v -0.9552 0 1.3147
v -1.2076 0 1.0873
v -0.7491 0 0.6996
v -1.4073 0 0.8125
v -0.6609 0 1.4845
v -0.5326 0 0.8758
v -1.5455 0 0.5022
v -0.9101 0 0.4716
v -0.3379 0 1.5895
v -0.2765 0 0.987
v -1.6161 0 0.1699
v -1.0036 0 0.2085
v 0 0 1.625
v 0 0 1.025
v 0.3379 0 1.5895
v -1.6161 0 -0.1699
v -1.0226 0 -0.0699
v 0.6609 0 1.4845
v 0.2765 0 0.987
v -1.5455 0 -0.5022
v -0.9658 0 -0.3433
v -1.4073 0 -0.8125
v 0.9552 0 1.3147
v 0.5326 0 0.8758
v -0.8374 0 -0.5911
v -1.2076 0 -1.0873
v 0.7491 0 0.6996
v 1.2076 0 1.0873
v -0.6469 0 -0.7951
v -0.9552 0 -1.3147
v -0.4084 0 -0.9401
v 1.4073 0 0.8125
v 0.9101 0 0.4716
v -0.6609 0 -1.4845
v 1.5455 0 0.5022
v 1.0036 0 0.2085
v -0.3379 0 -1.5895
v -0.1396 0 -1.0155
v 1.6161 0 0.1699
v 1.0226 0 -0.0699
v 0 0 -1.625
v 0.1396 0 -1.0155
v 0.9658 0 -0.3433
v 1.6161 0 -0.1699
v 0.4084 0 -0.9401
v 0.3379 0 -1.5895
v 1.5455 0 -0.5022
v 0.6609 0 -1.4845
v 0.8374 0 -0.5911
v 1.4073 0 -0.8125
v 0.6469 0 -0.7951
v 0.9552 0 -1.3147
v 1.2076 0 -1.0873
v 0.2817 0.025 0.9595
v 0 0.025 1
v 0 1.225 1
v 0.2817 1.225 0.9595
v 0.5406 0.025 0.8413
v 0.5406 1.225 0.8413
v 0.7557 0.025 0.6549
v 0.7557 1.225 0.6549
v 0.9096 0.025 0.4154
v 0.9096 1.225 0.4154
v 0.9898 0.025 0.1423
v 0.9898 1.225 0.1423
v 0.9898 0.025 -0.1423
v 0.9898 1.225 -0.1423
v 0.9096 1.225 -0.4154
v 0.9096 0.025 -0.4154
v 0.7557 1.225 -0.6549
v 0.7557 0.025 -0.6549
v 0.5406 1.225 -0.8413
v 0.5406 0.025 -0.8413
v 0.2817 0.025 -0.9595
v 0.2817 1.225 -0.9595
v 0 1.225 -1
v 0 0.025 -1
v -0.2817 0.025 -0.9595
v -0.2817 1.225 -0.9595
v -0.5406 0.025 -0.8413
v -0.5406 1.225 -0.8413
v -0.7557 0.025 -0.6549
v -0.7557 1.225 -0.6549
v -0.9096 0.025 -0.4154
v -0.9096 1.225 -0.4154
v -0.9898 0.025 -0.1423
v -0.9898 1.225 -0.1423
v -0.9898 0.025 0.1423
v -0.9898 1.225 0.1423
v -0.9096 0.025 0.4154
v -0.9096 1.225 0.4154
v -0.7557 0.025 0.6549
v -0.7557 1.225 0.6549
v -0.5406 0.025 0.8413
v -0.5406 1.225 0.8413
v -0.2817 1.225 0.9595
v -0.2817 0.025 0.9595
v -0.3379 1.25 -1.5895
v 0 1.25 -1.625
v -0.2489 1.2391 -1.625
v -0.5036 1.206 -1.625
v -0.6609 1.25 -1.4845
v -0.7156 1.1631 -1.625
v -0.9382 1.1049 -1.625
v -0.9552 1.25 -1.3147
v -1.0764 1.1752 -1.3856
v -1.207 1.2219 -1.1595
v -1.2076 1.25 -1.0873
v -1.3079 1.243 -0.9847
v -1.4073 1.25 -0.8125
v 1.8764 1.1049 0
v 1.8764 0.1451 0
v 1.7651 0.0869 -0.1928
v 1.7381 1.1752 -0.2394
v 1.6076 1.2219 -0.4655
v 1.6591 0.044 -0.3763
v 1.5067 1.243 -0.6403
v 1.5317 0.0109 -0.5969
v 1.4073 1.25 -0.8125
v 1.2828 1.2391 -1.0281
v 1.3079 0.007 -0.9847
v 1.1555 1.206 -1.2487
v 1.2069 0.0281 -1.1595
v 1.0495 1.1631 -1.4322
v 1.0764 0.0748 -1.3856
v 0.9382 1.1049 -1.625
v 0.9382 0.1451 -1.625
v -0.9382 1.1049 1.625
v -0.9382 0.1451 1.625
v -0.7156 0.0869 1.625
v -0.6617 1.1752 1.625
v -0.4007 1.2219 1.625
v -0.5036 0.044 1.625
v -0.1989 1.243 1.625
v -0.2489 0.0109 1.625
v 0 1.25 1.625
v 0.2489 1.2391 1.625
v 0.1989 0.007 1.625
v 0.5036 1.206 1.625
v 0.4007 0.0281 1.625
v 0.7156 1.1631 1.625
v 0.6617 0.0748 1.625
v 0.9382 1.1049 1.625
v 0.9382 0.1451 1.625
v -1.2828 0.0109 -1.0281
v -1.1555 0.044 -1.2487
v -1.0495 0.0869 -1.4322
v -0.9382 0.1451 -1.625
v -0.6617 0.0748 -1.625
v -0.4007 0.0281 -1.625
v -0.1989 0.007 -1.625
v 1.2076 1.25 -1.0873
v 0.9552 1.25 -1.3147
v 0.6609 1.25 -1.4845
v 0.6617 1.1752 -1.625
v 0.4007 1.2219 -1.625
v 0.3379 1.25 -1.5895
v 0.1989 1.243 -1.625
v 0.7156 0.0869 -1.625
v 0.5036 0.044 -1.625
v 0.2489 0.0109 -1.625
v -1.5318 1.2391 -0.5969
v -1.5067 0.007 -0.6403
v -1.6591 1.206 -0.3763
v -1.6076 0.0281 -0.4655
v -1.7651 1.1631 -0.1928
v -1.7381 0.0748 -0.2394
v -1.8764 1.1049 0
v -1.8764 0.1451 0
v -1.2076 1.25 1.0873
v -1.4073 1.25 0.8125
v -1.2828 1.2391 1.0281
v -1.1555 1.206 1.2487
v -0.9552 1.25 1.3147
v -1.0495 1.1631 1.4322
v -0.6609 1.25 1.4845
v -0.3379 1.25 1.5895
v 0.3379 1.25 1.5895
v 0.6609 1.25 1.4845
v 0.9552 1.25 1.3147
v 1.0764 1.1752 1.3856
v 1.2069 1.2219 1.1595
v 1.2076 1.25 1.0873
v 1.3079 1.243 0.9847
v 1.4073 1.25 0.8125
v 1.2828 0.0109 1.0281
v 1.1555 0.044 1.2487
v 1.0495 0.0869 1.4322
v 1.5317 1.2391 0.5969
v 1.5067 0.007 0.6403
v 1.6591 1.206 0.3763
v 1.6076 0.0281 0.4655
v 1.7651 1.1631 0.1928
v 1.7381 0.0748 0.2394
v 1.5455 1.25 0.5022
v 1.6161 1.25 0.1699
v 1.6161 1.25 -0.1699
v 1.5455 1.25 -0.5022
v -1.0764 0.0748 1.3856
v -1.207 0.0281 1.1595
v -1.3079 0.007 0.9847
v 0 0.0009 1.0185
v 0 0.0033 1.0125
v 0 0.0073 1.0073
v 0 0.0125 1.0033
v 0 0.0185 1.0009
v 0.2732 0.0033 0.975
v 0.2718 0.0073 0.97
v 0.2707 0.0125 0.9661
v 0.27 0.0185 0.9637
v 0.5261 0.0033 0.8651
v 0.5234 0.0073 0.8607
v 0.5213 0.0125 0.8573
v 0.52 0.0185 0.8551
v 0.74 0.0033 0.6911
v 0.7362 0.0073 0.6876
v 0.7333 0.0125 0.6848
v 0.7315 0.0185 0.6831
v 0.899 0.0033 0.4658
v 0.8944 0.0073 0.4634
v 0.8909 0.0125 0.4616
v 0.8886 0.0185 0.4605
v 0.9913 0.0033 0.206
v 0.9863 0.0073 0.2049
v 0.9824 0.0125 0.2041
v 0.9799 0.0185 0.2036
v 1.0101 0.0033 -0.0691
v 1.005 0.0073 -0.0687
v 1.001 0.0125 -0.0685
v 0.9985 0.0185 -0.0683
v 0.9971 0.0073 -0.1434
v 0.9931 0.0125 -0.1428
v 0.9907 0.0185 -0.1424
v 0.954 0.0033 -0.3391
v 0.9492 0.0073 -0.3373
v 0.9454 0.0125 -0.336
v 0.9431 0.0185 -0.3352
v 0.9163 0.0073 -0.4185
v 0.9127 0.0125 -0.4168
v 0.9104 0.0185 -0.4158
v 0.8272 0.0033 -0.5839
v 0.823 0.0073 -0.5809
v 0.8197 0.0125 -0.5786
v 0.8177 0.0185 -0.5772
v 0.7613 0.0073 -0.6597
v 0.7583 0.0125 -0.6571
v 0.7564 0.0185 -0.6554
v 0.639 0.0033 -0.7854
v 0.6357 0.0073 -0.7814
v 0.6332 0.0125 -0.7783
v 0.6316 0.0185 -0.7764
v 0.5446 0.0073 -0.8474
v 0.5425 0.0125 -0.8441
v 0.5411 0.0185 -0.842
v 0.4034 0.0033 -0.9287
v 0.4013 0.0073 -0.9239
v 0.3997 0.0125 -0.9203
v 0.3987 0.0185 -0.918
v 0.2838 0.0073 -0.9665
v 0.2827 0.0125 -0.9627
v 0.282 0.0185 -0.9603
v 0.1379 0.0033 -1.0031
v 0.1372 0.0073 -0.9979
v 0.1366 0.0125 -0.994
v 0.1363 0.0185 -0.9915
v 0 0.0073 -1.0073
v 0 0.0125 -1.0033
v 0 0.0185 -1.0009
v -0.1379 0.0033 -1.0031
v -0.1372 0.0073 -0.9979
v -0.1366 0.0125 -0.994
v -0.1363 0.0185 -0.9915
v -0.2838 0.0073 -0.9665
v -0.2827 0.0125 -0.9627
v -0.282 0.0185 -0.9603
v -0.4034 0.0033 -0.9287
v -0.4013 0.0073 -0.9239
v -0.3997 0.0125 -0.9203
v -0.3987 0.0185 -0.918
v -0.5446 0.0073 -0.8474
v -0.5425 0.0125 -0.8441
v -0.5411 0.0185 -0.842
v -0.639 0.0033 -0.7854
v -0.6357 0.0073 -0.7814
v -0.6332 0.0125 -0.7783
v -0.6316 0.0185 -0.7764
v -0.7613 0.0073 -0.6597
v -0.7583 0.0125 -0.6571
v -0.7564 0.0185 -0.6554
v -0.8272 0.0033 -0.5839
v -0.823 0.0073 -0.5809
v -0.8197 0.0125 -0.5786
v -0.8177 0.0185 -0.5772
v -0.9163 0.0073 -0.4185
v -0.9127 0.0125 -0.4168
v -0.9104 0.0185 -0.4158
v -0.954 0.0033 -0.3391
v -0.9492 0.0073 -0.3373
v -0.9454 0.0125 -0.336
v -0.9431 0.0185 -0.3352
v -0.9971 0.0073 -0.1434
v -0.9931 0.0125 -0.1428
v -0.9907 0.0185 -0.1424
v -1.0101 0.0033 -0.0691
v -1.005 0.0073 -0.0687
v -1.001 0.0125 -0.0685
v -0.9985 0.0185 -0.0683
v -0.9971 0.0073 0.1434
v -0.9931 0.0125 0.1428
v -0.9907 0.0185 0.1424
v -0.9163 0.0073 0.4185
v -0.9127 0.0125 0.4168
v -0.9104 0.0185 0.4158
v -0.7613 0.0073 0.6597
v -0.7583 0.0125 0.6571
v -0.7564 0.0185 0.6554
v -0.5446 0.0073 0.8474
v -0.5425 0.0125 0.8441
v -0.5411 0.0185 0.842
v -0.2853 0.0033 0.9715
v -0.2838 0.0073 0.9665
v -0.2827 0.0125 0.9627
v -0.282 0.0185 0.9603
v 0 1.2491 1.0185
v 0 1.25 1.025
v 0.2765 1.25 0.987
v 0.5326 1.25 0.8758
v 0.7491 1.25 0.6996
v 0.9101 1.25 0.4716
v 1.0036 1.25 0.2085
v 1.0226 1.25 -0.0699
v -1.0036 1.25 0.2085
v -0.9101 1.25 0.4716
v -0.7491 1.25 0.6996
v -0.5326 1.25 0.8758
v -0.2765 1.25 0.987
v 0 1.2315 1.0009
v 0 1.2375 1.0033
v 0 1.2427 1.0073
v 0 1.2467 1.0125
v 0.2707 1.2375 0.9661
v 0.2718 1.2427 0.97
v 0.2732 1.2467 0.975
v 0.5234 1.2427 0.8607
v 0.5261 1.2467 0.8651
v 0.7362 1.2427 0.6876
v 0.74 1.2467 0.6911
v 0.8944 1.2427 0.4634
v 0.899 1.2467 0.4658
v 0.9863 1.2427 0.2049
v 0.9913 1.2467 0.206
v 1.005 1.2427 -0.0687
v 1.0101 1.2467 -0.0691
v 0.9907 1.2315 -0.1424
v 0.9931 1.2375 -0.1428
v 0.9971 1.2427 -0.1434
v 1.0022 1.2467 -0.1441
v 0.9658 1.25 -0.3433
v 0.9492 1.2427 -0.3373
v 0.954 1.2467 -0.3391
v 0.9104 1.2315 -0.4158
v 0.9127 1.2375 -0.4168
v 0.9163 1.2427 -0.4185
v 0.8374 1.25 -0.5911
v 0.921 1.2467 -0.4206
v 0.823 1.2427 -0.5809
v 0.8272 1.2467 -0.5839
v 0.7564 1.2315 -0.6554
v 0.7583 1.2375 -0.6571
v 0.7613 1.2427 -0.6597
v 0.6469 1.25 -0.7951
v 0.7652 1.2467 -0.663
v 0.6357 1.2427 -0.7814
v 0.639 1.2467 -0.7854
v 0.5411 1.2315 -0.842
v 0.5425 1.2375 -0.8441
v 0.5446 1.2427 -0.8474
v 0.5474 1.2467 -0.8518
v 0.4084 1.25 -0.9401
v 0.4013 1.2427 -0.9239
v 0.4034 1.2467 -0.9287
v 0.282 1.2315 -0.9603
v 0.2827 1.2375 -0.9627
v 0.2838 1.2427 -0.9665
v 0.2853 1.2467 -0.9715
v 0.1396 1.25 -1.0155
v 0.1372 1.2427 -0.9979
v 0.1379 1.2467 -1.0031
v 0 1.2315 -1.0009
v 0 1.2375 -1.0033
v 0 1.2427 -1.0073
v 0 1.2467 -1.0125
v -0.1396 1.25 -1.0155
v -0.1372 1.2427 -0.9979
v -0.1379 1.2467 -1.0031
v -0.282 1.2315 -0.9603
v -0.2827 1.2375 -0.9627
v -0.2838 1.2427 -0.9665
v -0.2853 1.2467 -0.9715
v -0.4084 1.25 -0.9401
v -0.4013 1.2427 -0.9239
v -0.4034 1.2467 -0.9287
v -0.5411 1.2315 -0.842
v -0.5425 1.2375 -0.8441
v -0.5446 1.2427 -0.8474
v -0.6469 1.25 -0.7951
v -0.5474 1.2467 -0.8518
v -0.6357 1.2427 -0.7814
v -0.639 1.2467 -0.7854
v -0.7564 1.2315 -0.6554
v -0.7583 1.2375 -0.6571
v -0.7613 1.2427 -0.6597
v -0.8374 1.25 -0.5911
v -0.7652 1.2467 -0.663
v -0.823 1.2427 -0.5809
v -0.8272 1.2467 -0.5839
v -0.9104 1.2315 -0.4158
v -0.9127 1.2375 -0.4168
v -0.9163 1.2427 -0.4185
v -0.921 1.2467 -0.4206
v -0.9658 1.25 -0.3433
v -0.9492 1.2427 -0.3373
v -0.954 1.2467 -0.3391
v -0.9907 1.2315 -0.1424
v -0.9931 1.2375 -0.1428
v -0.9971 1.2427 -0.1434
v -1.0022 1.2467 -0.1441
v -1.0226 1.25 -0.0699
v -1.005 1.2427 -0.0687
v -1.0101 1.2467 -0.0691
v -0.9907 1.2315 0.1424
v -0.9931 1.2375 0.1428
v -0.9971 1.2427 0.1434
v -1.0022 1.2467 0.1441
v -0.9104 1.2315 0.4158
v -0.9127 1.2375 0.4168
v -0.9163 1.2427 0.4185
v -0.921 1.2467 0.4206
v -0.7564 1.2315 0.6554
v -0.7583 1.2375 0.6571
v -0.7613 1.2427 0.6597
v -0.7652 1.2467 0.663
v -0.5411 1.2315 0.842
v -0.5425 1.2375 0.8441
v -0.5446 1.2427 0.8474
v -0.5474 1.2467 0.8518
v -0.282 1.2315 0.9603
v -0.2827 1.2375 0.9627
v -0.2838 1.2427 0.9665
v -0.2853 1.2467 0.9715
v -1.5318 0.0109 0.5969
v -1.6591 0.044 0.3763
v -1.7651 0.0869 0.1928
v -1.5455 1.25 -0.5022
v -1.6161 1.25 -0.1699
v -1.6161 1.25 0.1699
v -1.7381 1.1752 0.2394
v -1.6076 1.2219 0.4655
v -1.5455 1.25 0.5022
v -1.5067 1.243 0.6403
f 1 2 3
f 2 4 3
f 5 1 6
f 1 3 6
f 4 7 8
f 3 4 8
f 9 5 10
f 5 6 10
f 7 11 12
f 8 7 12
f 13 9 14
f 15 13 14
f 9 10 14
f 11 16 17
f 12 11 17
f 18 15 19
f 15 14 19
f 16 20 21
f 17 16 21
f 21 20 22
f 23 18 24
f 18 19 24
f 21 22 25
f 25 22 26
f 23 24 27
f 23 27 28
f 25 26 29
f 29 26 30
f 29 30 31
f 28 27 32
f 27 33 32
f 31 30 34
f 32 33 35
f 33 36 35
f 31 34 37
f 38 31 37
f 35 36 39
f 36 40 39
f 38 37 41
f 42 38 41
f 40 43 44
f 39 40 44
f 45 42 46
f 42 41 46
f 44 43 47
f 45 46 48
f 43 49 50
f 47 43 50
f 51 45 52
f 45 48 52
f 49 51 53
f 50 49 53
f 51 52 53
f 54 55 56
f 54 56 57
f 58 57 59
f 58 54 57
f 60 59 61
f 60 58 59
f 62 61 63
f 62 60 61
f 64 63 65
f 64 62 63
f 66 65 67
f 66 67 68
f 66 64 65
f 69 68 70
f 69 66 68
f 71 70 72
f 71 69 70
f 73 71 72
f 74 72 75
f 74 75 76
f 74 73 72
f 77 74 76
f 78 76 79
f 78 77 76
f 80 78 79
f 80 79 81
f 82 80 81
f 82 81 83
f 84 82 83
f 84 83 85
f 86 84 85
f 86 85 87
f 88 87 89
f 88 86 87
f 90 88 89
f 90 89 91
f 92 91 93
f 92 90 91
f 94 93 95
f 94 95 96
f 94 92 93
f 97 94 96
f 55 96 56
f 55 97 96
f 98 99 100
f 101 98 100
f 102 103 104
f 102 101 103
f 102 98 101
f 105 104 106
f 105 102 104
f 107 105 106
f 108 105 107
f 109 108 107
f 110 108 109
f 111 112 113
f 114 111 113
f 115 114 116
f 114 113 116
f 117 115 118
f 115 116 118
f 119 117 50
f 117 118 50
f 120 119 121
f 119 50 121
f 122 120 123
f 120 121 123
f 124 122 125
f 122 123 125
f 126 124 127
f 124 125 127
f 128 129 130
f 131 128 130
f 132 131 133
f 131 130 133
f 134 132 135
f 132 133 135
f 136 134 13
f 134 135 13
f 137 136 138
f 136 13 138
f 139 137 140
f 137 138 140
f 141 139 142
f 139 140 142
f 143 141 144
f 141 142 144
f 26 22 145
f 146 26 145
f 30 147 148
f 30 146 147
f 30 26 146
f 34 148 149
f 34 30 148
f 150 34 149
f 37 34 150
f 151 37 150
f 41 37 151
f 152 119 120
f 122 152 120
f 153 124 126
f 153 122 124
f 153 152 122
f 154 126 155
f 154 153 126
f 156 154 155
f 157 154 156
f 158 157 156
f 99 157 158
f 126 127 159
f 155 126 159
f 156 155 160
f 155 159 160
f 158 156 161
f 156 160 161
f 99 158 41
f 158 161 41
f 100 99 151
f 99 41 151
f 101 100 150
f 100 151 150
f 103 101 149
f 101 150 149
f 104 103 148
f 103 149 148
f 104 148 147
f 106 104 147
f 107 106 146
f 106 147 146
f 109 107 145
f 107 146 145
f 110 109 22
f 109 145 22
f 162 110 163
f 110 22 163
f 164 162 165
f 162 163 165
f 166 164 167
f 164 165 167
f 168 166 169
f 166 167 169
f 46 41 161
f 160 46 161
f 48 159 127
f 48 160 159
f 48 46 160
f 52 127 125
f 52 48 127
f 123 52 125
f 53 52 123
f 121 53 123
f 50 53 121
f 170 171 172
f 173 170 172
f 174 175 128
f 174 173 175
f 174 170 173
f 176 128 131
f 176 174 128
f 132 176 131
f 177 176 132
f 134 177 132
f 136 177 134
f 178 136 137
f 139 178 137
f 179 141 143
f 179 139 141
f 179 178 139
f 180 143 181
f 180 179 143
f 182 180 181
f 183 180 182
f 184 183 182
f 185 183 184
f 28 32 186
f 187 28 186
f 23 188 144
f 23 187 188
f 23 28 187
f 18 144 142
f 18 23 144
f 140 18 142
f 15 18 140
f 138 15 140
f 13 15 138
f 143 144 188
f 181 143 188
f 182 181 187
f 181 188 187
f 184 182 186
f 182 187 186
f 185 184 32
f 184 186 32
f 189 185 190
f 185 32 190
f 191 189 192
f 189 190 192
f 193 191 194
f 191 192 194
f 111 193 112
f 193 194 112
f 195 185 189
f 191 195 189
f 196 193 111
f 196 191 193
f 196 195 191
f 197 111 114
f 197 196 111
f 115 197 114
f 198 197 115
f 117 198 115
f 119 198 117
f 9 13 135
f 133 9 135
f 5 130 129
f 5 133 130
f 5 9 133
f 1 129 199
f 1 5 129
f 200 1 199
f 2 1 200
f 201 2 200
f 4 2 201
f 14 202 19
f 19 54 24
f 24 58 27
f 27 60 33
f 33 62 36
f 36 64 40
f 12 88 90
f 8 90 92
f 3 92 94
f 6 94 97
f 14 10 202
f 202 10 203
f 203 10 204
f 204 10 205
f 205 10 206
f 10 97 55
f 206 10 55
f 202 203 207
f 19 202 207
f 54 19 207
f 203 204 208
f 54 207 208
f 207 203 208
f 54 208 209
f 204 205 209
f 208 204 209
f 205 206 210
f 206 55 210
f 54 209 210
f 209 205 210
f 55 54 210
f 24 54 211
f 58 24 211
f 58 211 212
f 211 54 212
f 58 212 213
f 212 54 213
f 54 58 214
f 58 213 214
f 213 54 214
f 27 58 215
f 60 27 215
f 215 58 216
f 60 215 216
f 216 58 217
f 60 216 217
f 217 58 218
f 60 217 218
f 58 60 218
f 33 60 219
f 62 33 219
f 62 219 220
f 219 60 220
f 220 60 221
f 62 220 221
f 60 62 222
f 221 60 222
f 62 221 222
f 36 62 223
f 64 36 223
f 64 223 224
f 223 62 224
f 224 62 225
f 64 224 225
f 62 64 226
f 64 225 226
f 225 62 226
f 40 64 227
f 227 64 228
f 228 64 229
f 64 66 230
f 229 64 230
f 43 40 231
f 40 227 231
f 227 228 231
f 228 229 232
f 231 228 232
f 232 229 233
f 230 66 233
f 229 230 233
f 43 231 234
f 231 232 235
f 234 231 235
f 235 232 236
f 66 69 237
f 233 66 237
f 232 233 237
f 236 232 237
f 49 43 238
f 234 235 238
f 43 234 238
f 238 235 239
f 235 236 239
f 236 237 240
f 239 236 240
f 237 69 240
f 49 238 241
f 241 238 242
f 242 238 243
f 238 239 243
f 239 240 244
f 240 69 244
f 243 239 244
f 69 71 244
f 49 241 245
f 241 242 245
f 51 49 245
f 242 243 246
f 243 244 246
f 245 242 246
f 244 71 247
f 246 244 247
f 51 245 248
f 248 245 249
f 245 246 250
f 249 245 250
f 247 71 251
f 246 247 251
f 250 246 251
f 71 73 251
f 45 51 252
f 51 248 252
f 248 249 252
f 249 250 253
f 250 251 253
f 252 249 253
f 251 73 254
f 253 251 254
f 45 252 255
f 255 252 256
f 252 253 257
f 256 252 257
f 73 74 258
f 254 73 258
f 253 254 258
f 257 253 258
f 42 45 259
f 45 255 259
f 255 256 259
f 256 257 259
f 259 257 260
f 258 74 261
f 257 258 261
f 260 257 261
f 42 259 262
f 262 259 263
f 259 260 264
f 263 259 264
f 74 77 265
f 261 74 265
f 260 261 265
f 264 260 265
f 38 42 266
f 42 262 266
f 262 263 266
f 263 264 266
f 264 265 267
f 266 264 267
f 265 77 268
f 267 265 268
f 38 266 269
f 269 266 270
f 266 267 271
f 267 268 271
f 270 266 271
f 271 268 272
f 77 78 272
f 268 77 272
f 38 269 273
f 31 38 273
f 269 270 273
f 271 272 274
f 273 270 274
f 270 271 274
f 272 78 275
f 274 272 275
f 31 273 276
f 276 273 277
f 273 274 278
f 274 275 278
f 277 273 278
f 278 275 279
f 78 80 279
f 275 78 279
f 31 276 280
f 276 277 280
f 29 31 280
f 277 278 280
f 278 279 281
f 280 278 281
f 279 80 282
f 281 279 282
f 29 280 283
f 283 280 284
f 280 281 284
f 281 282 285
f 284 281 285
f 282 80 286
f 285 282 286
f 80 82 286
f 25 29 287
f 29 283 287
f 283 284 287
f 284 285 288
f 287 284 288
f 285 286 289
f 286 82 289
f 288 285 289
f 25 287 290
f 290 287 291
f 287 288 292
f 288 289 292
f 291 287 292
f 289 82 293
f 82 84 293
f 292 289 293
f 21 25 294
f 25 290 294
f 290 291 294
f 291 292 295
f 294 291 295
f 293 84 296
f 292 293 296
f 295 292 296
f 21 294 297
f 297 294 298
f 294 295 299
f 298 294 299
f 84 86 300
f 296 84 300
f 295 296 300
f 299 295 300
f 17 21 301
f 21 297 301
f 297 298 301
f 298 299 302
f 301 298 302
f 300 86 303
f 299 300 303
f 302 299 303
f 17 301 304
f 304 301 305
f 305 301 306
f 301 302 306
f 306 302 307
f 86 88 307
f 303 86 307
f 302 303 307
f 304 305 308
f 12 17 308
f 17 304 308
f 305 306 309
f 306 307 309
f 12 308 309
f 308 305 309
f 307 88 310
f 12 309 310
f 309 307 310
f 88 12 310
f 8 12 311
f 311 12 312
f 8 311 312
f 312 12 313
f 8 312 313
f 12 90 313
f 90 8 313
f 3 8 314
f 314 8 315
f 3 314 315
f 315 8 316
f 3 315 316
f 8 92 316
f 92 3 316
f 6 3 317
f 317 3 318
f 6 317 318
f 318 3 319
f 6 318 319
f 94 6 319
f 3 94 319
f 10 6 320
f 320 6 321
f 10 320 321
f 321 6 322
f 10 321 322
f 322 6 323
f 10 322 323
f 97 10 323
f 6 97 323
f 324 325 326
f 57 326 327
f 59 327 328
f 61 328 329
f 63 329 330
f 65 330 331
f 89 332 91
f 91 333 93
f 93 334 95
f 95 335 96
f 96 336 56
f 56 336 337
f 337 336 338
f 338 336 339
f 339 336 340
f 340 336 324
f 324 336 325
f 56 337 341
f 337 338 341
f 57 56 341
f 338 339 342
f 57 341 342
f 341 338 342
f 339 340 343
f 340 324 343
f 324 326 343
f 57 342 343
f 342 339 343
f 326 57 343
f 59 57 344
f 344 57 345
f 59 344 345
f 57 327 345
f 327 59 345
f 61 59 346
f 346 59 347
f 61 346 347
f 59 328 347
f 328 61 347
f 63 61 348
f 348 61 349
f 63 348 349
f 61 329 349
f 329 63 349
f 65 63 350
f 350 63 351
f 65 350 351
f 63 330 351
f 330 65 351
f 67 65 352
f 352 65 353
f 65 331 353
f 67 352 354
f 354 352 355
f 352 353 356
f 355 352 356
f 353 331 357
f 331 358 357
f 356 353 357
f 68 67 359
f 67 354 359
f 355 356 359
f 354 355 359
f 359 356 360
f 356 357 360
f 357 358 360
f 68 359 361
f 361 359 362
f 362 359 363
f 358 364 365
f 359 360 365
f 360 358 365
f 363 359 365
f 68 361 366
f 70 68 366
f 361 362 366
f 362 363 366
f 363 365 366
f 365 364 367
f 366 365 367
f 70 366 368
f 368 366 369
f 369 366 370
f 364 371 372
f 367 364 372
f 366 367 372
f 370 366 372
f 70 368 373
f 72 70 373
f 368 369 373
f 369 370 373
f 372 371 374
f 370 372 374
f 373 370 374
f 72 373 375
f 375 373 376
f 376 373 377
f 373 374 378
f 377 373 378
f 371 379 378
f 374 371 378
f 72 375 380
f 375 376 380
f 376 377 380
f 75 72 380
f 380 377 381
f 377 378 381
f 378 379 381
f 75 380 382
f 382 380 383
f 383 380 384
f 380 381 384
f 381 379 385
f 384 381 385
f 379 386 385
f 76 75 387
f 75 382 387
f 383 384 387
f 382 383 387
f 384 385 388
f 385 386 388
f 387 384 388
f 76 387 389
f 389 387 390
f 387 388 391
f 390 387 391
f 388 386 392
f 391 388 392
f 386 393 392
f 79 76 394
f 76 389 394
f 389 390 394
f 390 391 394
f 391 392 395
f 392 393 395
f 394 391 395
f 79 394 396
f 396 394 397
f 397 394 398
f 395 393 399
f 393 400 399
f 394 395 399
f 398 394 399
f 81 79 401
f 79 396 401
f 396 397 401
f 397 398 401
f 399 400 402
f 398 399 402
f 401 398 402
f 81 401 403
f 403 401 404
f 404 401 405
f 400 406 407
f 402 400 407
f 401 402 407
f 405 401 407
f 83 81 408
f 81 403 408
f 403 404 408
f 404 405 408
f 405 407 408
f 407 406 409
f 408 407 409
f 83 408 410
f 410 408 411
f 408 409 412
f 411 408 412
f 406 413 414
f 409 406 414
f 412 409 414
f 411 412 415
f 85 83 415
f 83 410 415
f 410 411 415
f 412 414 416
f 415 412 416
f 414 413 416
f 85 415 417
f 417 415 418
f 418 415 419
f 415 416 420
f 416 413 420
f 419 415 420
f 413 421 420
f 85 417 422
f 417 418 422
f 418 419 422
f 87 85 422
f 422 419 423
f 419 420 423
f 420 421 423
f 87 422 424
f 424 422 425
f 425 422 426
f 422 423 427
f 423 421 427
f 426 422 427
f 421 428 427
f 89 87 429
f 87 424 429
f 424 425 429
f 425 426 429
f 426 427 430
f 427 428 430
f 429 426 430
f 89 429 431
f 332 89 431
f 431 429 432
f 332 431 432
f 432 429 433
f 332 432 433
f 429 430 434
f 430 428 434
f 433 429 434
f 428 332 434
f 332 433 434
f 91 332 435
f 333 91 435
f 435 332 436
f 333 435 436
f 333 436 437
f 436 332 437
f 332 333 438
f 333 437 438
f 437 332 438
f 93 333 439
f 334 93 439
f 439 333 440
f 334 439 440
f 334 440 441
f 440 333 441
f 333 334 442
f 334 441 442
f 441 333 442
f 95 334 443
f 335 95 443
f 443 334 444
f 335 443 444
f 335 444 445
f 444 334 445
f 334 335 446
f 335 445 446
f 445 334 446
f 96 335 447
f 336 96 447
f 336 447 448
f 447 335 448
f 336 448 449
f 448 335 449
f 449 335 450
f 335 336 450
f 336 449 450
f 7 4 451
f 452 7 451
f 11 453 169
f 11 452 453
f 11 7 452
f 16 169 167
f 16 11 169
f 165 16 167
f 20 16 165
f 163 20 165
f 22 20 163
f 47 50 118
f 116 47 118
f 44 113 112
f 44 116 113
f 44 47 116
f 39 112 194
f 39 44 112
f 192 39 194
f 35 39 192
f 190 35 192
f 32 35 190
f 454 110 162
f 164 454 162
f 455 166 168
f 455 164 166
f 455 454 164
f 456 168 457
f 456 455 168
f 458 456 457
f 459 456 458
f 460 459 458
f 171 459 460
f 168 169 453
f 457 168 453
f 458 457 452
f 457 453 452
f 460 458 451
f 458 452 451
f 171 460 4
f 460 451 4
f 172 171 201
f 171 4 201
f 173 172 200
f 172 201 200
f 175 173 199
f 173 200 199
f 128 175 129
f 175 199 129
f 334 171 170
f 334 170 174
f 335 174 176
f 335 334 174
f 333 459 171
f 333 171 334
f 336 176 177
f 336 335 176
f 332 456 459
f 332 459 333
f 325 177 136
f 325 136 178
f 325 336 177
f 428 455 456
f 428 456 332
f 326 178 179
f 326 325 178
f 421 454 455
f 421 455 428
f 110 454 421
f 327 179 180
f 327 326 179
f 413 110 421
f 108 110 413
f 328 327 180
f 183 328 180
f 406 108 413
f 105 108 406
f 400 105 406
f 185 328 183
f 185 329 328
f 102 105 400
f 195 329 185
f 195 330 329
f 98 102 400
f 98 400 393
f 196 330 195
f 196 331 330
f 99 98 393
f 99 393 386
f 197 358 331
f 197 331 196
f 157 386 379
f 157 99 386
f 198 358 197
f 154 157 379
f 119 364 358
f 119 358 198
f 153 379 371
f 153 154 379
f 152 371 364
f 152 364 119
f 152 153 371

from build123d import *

# Parameters (mm, degrees)
SKETCH1_R           = 1
BOSS_EXTRUDE3_DEPTH = 1.25
SKETCH3_OUTSIDE_W   = 10.24
SKETCH3_OUTSIDE_H   = 9.738
SKETCH3_OUTSIDE_R   = 1.625
CUT_EXTRUDE1_DEPTH  = 1
CUT_EXTRUDE1_DRAFT  = -60
SKETCH4_OUTSIDE_W   = 10.24
SKETCH4_OUTSIDE_H   = 9.738
SKETCH4_OUTSIDE_R   = 1.625
CUT_EXTRUDE2_DEPTH  = 1
CUT_EXTRUDE2_DRAFT  = -60
FILLET1_R           = 0.025


with BuildPart() as part:
    # Sketch1 → Boss-Extrude3 (new body)
    with BuildSketch(Plane(origin=(0, 0, 0), x_dir=(1, 0, 0), z_dir=(0, 1, 0))):
        Polygon((-1.876388375, 0), (-0.938194187, -1.625), (0.938194187, -1.625), (1.876388375, 0), (0.938194187, 1.625), (-0.938194187, 1.625), align=None)
        with Locations(Location((0, 0, 0), (0, 0, 270))):
            Circle(SKETCH1_R, mode=Mode.SUBTRACT)
    extrude(amount=BOSS_EXTRUDE3_DEPTH)


with BuildPart() as cut_extrude1_tool:
    # Sketch3 outside → Cut-Extrude1 (with draft: the straight prism first)
    with BuildSketch(Plane(origin=(0, 1.25, 0), x_dir=(1, 0, 0), z_dir=(0, 1, 0))):
        Rectangle(SKETCH3_OUTSIDE_W, SKETCH3_OUTSIDE_H)
        Circle(SKETCH3_OUTSIDE_R, mode=Mode.SUBTRACT)
    extrude(amount=-CUT_EXTRUDE1_DEPTH)
    # Cut-Extrude1: the draft: its side faces are tilted about the plane it starts from
    cut_extrude1_sides = [cut_extrude1_tool.faces().sort_by_distance(p)[0] for p in [
        (0, 0.75, 4.869),
        (5.12, 0.75, 0),
        (0, 0.75, -4.869),
        (-5.12, 0.75, 0),
        (-1.625, 0.75, 0),
    ]]
    draft(cut_extrude1_sides, Plane(origin=(0, 1.25, 0), x_dir=(1, 0, 0), z_dir=(0, 1, 0)), CUT_EXTRUDE1_DRAFT)


with BuildPart() as part_1:
    add(part.part)

    # Cut-Extrude1: cut by cut_extrude1_tool
    add(cut_extrude1_tool.part, mode=Mode.SUBTRACT)


with BuildPart() as cut_extrude2_tool:
    # Sketch4 outside → Cut-Extrude2 (with draft: the straight prism first)
    with BuildSketch(Plane.XZ):
        Rectangle(SKETCH4_OUTSIDE_W, SKETCH4_OUTSIDE_H)
        Circle(SKETCH4_OUTSIDE_R, mode=Mode.SUBTRACT)
    extrude(amount=-CUT_EXTRUDE2_DEPTH)
    # Cut-Extrude2: the draft: its side faces are tilted about the plane it starts from
    cut_extrude2_sides = [cut_extrude2_tool.faces().sort_by_distance(p)[0] for p in [
        (0, 0.5, -4.869),
        (5.12, 0.5, 0),
        (0, 0.5, 4.869),
        (-5.12, 0.5, 0),
        (-1.625, 0.5, 0),
    ]]
    draft(cut_extrude2_sides, Plane.XZ, CUT_EXTRUDE2_DRAFT)


with BuildPart() as part_2:
    add(part_1.part)

    # Cut-Extrude2: cut by cut_extrude2_tool
    add(cut_extrude2_tool.part, mode=Mode.SUBTRACT)

    # Fillet1
    fillet1_edges = [part_2.edges().sort_by_distance(p)[0] for p in [
        (0, 0, -1),
        (0, 1.25, -1),
    ]]
    fillet(fillet1_edges, radius=FILLET1_R)


solid = part_2.part
